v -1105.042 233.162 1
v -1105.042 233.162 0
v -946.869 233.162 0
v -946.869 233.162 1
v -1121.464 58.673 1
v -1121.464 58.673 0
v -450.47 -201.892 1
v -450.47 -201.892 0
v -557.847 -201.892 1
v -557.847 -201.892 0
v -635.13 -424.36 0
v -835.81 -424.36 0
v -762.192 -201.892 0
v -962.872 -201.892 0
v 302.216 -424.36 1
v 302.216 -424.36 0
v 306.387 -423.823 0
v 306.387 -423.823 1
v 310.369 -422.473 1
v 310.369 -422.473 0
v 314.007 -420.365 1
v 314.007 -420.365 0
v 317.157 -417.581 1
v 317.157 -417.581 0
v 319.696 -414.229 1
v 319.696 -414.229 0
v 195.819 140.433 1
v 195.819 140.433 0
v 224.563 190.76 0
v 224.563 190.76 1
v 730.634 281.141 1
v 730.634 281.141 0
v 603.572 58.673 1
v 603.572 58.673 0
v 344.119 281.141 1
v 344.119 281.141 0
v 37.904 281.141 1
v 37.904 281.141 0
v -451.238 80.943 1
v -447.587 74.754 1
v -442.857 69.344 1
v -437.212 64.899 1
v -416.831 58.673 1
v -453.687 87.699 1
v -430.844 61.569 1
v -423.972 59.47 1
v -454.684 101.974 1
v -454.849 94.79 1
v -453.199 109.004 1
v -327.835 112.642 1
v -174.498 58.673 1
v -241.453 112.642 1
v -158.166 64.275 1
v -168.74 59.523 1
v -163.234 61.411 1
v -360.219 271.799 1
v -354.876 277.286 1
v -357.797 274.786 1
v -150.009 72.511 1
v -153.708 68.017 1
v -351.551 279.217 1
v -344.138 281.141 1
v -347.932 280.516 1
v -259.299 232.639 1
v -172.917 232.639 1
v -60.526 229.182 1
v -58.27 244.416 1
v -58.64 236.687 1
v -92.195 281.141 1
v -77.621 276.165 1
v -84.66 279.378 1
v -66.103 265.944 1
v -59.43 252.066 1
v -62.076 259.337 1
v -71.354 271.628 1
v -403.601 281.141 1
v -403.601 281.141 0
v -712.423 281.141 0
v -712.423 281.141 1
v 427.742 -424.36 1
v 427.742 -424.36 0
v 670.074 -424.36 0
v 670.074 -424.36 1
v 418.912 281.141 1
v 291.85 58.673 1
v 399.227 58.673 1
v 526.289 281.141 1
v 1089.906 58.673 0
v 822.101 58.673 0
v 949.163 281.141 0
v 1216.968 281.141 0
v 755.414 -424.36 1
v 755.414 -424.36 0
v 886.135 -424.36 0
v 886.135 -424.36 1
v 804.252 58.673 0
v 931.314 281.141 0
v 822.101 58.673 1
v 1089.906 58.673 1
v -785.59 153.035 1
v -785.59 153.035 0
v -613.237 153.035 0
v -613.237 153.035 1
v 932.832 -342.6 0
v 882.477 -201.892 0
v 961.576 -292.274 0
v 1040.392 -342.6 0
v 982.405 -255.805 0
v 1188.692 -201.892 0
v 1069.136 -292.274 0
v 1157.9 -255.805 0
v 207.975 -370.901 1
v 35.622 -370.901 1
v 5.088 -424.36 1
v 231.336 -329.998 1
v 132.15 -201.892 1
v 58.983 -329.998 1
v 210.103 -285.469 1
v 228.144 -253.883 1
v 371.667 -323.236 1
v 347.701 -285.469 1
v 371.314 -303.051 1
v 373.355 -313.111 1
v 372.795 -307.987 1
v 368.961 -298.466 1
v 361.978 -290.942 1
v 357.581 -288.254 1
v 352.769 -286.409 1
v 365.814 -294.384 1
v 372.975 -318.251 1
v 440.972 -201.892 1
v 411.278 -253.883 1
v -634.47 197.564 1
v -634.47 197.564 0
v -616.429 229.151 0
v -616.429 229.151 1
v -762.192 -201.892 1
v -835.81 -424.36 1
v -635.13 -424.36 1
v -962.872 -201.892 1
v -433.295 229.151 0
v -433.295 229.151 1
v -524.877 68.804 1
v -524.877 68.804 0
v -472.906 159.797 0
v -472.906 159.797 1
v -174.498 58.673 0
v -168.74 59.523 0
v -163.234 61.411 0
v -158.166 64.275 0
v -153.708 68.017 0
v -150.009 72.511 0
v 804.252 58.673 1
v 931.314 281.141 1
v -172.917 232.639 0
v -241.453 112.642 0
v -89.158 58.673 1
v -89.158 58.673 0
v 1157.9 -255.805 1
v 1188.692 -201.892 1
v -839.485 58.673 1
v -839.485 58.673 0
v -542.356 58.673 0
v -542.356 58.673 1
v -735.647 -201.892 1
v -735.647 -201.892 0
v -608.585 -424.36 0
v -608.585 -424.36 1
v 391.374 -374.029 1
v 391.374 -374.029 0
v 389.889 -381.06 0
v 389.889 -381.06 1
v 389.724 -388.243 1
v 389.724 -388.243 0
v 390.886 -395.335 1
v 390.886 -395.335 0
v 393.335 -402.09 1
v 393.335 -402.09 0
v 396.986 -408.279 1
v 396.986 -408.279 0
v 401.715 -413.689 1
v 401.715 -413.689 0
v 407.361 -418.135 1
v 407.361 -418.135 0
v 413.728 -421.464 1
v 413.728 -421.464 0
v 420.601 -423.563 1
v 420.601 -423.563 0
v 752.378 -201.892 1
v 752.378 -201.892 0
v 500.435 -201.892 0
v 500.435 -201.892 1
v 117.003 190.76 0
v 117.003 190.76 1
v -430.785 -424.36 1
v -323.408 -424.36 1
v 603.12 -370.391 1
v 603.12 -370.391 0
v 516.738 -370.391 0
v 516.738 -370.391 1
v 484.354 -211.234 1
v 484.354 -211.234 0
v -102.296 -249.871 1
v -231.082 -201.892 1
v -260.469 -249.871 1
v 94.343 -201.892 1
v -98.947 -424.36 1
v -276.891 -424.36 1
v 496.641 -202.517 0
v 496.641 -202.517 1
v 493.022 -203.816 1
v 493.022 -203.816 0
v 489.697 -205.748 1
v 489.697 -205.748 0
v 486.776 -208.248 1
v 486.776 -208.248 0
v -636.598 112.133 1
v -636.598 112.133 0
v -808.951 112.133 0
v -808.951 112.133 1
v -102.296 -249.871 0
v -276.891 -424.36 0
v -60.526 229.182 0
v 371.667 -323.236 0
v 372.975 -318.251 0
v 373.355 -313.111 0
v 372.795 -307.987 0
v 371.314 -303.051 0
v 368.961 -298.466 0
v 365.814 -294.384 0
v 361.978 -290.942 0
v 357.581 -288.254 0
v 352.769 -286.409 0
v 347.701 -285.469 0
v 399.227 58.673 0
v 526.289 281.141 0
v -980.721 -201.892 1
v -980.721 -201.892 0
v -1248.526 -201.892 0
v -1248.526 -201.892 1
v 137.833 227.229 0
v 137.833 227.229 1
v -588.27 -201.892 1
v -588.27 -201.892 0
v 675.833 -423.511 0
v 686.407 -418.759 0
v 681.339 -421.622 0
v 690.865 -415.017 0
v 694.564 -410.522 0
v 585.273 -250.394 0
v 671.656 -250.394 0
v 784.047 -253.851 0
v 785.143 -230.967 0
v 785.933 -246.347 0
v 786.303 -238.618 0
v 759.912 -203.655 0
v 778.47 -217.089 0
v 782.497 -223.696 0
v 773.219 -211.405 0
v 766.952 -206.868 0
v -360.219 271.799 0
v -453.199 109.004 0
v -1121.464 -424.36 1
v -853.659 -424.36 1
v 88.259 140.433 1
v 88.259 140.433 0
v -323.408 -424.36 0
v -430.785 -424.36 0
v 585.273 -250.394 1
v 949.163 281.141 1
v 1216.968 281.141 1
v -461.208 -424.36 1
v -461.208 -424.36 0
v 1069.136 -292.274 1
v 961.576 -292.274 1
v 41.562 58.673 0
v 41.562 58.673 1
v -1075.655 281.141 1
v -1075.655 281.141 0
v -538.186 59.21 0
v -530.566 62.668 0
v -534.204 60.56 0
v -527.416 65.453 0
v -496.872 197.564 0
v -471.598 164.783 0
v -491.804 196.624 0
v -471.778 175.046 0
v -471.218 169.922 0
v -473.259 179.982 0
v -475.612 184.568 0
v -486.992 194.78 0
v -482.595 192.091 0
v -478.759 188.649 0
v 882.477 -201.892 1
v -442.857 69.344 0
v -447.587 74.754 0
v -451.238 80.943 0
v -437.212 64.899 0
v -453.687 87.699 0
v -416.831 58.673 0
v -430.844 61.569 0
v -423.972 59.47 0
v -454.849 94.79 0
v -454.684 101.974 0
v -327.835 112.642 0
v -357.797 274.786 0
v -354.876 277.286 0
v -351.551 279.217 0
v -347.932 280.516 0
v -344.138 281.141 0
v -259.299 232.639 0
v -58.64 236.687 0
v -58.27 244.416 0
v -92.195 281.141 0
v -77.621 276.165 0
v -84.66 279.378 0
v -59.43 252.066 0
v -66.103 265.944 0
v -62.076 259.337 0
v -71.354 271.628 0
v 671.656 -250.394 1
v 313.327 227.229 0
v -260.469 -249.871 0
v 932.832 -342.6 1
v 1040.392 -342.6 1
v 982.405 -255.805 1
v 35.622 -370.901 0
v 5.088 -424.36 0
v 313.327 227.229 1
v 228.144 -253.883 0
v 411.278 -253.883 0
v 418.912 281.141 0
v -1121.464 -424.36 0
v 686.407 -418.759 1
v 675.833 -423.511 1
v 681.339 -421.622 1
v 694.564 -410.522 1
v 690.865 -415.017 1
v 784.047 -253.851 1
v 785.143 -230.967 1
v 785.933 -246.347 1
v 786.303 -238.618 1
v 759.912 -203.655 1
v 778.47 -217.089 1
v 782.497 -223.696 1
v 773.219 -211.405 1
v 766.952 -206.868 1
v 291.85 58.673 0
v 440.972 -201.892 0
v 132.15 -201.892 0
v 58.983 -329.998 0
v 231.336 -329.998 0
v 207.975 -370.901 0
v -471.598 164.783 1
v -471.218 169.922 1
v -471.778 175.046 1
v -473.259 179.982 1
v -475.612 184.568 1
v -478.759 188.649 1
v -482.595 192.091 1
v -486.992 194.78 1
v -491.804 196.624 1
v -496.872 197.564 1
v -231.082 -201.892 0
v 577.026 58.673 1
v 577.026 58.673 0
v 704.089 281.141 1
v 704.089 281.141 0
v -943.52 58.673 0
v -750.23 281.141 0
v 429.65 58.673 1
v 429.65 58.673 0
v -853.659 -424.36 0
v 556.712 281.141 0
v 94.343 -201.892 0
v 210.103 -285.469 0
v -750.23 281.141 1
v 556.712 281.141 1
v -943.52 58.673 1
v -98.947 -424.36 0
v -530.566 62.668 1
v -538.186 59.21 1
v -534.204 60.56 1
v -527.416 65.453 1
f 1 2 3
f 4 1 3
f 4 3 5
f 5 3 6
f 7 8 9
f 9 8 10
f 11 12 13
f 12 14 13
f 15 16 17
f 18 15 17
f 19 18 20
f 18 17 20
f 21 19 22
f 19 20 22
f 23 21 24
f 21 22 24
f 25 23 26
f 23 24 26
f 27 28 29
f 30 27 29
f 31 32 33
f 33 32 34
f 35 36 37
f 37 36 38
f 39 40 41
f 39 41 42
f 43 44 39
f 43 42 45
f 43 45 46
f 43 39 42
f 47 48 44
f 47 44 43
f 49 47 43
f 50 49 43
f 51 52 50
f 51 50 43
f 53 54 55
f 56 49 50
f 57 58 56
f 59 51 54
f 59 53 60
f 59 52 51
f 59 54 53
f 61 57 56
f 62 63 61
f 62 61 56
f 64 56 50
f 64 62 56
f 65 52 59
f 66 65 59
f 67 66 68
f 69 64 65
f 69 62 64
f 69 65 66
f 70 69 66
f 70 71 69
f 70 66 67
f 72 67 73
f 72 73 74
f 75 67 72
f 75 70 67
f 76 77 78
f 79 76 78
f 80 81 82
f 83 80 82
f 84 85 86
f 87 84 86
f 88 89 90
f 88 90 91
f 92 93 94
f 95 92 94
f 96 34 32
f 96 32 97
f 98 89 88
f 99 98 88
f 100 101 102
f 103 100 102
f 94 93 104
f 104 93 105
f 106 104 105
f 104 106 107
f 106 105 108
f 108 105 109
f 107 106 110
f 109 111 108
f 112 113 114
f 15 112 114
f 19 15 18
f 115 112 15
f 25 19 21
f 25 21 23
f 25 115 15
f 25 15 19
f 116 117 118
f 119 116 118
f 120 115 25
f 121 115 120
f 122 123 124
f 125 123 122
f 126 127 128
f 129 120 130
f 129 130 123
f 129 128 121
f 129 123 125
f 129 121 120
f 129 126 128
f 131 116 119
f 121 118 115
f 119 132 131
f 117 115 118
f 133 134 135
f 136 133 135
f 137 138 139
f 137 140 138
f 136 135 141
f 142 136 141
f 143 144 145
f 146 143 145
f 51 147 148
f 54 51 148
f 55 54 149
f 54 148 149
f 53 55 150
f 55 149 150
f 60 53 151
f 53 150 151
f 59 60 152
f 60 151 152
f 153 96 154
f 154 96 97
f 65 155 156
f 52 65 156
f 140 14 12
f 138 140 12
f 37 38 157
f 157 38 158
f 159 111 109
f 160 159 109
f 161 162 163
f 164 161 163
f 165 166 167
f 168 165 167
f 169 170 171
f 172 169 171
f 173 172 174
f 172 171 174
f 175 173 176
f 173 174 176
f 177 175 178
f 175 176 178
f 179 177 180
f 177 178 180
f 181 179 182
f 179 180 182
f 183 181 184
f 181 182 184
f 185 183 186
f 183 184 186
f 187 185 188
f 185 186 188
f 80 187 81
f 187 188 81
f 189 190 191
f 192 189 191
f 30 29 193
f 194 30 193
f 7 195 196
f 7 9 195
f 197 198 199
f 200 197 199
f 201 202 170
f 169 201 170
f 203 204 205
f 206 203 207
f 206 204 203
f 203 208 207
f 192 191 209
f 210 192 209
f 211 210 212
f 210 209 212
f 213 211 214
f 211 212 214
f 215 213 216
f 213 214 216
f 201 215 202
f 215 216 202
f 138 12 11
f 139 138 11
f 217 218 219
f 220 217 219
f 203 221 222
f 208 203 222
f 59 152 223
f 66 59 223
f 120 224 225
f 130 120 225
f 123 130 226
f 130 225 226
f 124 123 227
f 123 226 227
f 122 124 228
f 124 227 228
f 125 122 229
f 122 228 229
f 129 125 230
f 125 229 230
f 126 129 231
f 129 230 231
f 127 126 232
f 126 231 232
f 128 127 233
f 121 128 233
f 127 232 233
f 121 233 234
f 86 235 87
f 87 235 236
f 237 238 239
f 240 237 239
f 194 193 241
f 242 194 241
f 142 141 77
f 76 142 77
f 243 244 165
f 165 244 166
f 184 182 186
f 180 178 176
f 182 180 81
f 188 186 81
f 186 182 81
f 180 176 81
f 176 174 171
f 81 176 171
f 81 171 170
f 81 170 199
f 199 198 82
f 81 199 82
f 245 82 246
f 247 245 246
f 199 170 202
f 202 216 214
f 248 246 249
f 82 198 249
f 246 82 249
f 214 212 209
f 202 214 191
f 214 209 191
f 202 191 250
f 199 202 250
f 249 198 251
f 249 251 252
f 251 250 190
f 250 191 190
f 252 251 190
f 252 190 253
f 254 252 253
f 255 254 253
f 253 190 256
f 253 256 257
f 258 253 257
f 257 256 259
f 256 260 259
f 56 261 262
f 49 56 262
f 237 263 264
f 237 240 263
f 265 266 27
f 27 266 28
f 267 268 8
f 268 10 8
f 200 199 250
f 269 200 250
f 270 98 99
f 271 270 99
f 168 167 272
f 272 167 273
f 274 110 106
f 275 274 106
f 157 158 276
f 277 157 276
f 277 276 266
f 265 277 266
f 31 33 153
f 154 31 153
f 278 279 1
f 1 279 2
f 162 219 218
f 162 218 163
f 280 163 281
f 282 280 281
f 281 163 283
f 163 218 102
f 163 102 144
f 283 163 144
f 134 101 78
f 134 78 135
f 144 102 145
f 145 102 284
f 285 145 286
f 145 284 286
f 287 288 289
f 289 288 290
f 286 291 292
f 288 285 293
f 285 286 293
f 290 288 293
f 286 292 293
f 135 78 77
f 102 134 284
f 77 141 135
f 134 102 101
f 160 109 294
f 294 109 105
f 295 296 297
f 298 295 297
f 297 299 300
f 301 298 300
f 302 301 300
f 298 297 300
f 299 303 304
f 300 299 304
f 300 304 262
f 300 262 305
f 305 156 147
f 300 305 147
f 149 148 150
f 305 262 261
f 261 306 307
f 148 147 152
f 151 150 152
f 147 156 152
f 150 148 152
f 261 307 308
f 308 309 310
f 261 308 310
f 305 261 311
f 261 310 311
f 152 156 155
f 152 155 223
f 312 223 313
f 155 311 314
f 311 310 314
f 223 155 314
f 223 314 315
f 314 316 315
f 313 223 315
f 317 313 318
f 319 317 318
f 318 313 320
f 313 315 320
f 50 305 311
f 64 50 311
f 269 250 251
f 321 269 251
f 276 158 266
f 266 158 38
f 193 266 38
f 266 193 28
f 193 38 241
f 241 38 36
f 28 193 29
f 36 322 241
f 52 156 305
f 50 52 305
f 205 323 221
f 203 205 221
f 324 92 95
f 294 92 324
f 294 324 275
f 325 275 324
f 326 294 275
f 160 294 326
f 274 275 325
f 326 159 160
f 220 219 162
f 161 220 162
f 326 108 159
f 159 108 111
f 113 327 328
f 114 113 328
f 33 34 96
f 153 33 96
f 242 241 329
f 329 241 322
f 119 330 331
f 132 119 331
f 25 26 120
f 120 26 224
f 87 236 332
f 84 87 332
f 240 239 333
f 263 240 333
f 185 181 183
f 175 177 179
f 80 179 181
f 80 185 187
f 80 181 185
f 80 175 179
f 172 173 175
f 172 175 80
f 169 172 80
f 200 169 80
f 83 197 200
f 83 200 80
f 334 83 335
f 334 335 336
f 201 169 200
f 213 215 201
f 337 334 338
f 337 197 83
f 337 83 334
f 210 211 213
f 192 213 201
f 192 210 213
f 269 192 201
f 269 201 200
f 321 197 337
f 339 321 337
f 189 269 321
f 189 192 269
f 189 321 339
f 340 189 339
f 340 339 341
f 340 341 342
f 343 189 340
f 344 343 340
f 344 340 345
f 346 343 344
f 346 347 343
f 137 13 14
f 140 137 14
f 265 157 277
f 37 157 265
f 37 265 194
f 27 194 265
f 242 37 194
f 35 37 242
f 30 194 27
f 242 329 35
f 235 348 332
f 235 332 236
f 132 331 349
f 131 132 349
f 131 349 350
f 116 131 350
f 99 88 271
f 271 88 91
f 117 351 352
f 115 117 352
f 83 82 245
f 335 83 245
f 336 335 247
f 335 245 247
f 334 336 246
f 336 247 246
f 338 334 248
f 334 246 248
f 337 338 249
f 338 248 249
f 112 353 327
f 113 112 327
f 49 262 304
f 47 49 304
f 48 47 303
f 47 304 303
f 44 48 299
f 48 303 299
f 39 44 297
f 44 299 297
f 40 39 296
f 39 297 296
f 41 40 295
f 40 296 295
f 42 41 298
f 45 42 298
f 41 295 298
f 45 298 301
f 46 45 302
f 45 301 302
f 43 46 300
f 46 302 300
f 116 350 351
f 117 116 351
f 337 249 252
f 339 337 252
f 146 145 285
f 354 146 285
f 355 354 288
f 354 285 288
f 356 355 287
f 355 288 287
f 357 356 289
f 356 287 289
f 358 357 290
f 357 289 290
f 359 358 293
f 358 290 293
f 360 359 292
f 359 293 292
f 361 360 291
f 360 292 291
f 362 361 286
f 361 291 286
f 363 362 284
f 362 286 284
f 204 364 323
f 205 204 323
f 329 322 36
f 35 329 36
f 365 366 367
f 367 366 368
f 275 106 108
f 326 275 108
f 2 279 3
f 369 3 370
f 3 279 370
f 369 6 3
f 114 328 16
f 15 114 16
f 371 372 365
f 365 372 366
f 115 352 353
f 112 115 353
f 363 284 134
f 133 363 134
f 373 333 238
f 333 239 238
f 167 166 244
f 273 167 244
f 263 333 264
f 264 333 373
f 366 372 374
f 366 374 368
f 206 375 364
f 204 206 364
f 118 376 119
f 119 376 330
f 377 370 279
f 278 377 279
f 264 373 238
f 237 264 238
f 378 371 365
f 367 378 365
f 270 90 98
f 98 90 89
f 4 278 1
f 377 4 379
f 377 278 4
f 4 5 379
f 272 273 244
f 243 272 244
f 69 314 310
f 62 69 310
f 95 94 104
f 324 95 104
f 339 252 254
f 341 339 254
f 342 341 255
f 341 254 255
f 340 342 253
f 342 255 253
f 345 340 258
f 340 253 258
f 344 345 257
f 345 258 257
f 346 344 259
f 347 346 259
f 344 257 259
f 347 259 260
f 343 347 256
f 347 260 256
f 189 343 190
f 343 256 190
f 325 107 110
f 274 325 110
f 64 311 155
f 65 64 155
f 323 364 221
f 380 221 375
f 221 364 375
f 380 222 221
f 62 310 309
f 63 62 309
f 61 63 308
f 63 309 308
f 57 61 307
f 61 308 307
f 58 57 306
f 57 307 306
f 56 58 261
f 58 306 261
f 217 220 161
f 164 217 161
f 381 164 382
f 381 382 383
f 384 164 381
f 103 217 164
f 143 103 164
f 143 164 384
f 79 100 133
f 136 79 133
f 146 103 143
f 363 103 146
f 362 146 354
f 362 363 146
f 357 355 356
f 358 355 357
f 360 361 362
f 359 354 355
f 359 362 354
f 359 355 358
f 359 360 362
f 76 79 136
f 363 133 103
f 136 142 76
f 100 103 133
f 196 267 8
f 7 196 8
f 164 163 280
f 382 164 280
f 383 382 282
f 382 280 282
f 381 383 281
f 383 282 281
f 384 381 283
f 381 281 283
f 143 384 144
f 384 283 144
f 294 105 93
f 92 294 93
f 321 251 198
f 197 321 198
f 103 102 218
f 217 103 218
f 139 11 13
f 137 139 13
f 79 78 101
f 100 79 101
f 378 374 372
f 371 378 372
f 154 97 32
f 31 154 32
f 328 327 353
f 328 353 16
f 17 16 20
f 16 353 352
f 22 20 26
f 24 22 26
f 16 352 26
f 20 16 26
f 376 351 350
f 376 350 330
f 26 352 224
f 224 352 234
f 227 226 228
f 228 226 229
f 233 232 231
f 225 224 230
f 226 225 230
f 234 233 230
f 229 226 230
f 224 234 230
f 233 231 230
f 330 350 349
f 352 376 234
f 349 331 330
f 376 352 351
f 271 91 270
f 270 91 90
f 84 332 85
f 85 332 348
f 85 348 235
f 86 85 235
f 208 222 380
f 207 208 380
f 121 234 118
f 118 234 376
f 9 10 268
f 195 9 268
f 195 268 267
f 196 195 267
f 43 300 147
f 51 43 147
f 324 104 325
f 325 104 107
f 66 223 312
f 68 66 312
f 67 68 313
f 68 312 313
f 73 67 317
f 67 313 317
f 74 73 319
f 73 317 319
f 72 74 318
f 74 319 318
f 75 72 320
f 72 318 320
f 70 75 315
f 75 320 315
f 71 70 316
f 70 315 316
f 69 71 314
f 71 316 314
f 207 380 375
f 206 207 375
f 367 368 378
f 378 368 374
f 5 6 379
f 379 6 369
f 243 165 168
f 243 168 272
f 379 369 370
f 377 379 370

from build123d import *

# Parameters (mm, degrees)
F1_DEPTH = 1


with BuildPart() as f1:
    # F0 (on Top) → F1 (new body)
    with BuildSketch(Plane.XY):
        with BuildLine():
            ThreePointArc((500.434995, -201.892406), (491.315661, -204.70633), (484.353985, -211.234386))
            Line((484.353985, -211.234386), (391.37412, -374.029141))
            ThreePointArc((391.37412, -374.029141), (396.986116, -408.278941), (427.742094, -424.360394))
            Line((427.742094, -424.360394), (670.074493, -424.360394))
            ThreePointArc((670.074493, -424.360394), (683.938685, -420.306977), (694.564374, -410.522256))
            Line((694.564374, -410.522256), (784.046918, -253.850822))
            ThreePointArc((784.046918, -253.850822), (780.647239, -220.292596), (752.378081, -201.892406))
            Line((752.378081, -201.892406), (500.434995, -201.892406))
        make_face()
        Polygon((516.737572, -370.391047), (585.273436, -250.394323), (671.655706, -250.394323), (603.119842, -370.391047), align=None, mode=Mode.SUBTRACT)
        Polygon((-1121.464133, -424.360394), (-853.658855, -424.360394), (-980.720956, -201.892406), (-1248.526234, -201.892406), align=None)
        with BuildLine():
            ThreePointArc((-344.137906, 281.140864), (-353.257241, 278.326939), (-360.218916, 271.798883))
            Line((-360.218916, 271.798883), (-453.198781, 109.004128))
            ThreePointArc((-453.198781, 109.004128), (-447.586786, 74.754328), (-416.830808, 58.672875))
            Line((-416.830808, 58.672875), (-174.498409, 58.672875))
            ThreePointArc((-174.498409, 58.672875), (-160.634217, 62.726293), (-150.008528, 72.511013))
            Line((-150.008528, 72.511013), (-60.525984, 229.182448))
            ThreePointArc((-60.525984, 229.182448), (-63.925662, 262.740673), (-92.194821, 281.140864))
            Line((-92.194821, 281.140864), (-344.137906, 281.140864))
        make_face()
        Polygon((-327.83533, 112.642223), (-259.299466, 232.638947), (-172.917196, 232.638947), (-241.45306, 112.642223), align=None, mode=Mode.SUBTRACT)
        Polygon((-750.229657, 281.140864), (-1075.654507, 281.140864), (-1105.041742, 233.162016), (-946.868837, 233.162016), (-1121.464133, 58.672875), (-943.52003, 58.672875), align=None)
        with BuildLine():
            Line((-808.951381, 112.132645), (-839.484811, 58.672875))
            Line((-839.484811, 58.672875), (-542.356426, 58.672875))
            ThreePointArc((-542.356426, 58.672875), (-532.332828, 61.523635), (-524.876545, 68.803965))
            Line((-524.876545, 68.803965), (-472.90582, 159.797443))
            ThreePointArc((-472.90582, 159.797443), (-475.611862, 184.567635), (-496.87165, 197.564037))
            Line((-496.87165, 197.564037), (-634.469989, 197.564037))
            Line((-634.469989, 197.564037), (-616.429329, 229.150713))
            Line((-616.429329, 229.150713), (-433.294853, 229.150713))
            Line((-433.294853, 229.150713), (-403.600793, 281.140864))
            Line((-403.600793, 281.140864), (-712.42271, 281.140864))
            Line((-712.42271, 281.140864), (-785.590204, 153.034804))
            Line((-785.590204, 153.034804), (-613.237023, 153.034804))
            Line((-613.237023, 153.034804), (-636.598201, 112.132645))
            Line((-636.598201, 112.132645), (-808.951381, 112.132645))
        make_face()
        Polygon((526.288807, 281.140864), (418.912411, 281.140864), (291.85031, 58.672875), (399.226706, 58.672875), align=None)
        Polygon((704.088587, 281.140864), (556.712151, 281.140864), (429.65005, 58.672875), (577.026486, 58.672875), align=None)
        Polygon((931.314189, 281.140864), (730.634172, 281.140864), (603.572071, 58.672875), (804.252088, 58.672875), align=None)
        Polygon((1216.968197, 281.140864), (949.162919, 281.140864), (822.100818, 58.672875), (1089.906096, 58.672875), align=None)
        Polygon((344.11915, 281.140864), (37.90367, 281.140864), (-89.158431, 58.672875), (41.562274, 58.672875), (88.259261, 140.432776), (195.818674, 140.432776), (224.562711, 190.759569), (117.003298, 190.759569), (137.832541, 227.228664), (313.327316, 227.228664), align=None)
        Polygon((94.343245, -201.892406), (-231.081605, -201.892406), (-260.468841, -249.871254), (-102.295935, -249.871254), (-276.891232, -424.360394), (-98.947128, -424.360394), align=None)
        with BuildLine():
            Line((35.621521, -370.900625), (5.088091, -424.360394))
            Line((5.088091, -424.360394), (302.216476, -424.360394))
            ThreePointArc((302.216476, -424.360394), (312.240074, -421.509635), (319.696357, -414.229305))
            Line((319.696357, -414.229305), (371.667081, -323.235826))
            ThreePointArc((371.667081, -323.235826), (368.96104, -298.465634), (347.701252, -285.469233))
            Line((347.701252, -285.469233), (210.102912, -285.469233))
            Line((210.102912, -285.469233), (228.143573, -253.882556))
            Line((228.143573, -253.882556), (411.278049, -253.882556))
            Line((411.278049, -253.882556), (440.972108, -201.892406))
            Line((440.972108, -201.892406), (132.150192, -201.892406))
            Line((132.150192, -201.892406), (58.982698, -329.998466))
            Line((58.982698, -329.998466), (231.335878, -329.998466))
            Line((231.335878, -329.998466), (207.974701, -370.900625))
            Line((207.974701, -370.900625), (35.621521, -370.900625))
        make_face()
        Polygon((1188.692052, -201.892406), (882.476572, -201.892406), (755.414471, -424.360394), (886.135176, -424.360394), (932.832163, -342.600494), (1040.391576, -342.600494), (1069.135612, -292.273701), (961.5762, -292.273701), (982.405443, -255.804605), (1157.900218, -255.804605), align=None)
        Polygon((-430.784743, -424.360394), (-323.408347, -424.360394), (-450.470448, -201.892406), (-557.846844, -201.892406), align=None)
        Polygon((-461.208086, -424.360394), (-588.270187, -201.892406), (-735.646624, -201.892406), (-608.584523, -424.360394), align=None)
        Polygon((-835.810125, -424.360394), (-635.130107, -424.360394), (-762.192208, -201.892406), (-962.872226, -201.892406), align=None)
    extrude(amount=F1_DEPTH)


solid = f1.part
